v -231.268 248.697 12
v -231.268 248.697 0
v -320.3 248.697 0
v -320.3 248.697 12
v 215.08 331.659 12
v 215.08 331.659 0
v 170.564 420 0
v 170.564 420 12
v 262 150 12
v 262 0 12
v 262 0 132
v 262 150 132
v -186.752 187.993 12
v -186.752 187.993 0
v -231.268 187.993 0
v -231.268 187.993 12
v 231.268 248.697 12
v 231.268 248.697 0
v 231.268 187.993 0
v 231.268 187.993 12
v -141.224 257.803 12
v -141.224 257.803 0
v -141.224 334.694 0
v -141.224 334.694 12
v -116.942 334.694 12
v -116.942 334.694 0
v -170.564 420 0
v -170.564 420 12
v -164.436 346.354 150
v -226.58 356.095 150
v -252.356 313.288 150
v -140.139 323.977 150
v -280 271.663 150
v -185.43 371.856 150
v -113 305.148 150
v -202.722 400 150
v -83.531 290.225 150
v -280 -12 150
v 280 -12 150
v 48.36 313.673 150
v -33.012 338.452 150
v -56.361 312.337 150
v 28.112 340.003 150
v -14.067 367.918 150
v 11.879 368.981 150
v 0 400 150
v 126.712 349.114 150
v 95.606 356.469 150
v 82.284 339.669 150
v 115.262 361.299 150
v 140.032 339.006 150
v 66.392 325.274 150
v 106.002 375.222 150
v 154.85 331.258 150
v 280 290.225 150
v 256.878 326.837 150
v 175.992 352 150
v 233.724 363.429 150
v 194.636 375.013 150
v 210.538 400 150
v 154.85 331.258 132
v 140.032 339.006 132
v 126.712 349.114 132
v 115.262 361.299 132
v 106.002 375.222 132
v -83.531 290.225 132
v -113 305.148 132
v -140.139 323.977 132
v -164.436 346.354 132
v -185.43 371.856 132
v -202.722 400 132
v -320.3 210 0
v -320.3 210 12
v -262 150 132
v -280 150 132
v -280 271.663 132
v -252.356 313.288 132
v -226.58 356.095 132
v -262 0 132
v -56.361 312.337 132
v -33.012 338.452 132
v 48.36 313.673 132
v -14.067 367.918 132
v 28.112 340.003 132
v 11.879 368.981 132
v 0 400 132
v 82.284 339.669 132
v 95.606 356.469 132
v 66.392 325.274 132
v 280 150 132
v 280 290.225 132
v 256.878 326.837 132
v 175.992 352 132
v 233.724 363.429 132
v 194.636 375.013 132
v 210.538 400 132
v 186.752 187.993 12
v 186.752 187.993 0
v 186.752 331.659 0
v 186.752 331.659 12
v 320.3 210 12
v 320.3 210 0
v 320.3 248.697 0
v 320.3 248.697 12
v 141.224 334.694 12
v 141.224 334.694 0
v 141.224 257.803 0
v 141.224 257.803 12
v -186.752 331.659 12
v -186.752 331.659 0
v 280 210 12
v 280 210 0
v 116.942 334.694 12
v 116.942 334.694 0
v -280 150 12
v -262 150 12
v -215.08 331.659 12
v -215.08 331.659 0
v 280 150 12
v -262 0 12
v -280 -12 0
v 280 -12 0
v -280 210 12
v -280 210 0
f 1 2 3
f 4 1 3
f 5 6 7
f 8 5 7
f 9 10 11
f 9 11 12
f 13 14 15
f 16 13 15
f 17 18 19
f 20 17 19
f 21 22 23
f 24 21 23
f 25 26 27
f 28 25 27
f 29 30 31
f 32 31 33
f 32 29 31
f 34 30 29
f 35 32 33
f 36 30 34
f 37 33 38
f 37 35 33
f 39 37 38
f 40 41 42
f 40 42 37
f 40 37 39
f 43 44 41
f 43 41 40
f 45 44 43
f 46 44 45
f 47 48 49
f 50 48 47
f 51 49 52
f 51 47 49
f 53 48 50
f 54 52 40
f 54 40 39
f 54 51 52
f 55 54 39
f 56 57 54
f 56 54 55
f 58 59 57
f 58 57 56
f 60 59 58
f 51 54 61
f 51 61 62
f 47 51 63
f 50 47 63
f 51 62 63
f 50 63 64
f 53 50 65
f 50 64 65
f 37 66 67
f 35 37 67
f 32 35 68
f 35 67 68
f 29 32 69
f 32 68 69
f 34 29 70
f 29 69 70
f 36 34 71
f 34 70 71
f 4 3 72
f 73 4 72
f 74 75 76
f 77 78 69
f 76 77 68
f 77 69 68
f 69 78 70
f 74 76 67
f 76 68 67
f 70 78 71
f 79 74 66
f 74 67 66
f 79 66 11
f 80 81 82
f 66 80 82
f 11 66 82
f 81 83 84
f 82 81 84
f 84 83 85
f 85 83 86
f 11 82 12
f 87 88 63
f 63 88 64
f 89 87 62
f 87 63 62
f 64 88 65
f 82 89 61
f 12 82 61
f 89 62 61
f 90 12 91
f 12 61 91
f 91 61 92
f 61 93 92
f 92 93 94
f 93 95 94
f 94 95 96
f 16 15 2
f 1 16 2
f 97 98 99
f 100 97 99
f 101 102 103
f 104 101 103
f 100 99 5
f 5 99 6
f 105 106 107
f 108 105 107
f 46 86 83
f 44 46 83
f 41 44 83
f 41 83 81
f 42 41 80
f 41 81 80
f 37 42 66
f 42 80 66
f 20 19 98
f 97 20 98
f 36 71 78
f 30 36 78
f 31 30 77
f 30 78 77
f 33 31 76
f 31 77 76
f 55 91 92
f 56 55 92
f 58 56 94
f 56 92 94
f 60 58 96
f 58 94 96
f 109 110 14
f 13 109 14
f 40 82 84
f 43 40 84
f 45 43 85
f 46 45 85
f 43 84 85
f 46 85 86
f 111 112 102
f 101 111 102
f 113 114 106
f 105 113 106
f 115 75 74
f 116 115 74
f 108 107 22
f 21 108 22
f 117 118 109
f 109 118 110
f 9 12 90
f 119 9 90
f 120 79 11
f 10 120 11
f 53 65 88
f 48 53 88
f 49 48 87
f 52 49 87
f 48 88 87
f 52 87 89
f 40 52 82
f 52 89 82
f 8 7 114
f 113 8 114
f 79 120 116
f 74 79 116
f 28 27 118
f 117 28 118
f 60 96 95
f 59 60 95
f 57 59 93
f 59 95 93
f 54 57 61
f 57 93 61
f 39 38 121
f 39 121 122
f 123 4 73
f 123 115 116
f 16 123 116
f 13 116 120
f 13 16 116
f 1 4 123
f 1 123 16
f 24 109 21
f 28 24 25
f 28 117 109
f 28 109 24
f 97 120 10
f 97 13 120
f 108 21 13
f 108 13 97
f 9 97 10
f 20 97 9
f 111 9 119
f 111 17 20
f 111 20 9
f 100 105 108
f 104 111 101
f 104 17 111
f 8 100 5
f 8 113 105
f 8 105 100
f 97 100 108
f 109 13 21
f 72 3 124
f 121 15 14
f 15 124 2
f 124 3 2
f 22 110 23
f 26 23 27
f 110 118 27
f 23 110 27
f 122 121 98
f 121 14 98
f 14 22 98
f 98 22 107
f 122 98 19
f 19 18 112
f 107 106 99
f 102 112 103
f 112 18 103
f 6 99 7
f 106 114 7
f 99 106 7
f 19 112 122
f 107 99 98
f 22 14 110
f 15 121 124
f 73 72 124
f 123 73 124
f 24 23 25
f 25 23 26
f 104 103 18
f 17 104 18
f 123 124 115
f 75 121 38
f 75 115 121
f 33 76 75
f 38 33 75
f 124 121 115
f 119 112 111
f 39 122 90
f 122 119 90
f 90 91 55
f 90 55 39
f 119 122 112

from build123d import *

# Parameters (mm, degrees)
F1_DEPTH = 12
F2_W     = 18
F2_H     = 150
F3_DEPTH = 120
F4_W     = 18
F4_H     = 150
F5_DEPTH = 18
F6_W     = 560
F6_H     = 150
F7_DEPTH = 12


with BuildPart() as f1:
    # F0 (on Top) → F1 (new body)
    with BuildSketch(Plane.XY):
        Polygon((-280, 0), (0, 0), (0, 257.8027844429), (-141.2238776684, 257.8027844429), (-141.2238776684, 334.6943855286), (-116.9423237443, 334.6943855286), (-170.564070344, 420), (-215.0802463293, 331.659168005), (-186.751767993, 331.659168005), (-186.751767993, 187.9933476448), (-231.2679439783, 187.9933476448), (-231.2679439783, 248.6972212791), (-320.3002810478, 248.6972212791), (-320.3002810478, 210), (-280, 210), align=None)
        Polygon((0, 257.8027844429), (0, 0), (280, 0), (280, 210), (320.3002810478, 210), (320.3002810478, 248.6972212791), (231.2679439783, 248.6972212791), (231.2679439783, 187.9933476448), (186.751767993, 187.9933476448), (186.751767993, 331.659168005), (215.0802463293, 331.659168005), (170.564070344, 420), (116.9423237443, 334.6943855286), (141.2238776684, 334.6943855286), (141.2238776684, 257.8027844429), align=None)
    extrude(amount=F1_DEPTH)

    # F2 (on face) → F3 (join)
    with BuildSketch(Plane.XY.offset(12)):
        with Locations((271, 75)):
            Rectangle(F2_W, F2_H)
        with Locations((-271, 75)):
            Rectangle(F2_W, F2_H)
    extrude(amount=F3_DEPTH)

    # F4 (on face) → F5 (join)
    with BuildSketch(Plane.XY.offset(132)):
        with Locations((-271, 75)):
            Rectangle(F4_W, F4_H)
        with BuildLine():
            Line((-262, 150), (-262, 0))
            Line((-262, 0), (280, 0))
            Line((280, 0), (280, 290.2253270149))
            ThreePointArc((280, 290.2253270149), (245.3046465179, 345.1352809089), (210.5378061533, 400))
            ThreePointArc((210.5378061533, 400), (185.6424554033, 363.2406210102), (154.8503190279, 331.2582075596))
            ThreePointArc((154.8503190279, 331.2582075596), (126.7121671615, 349.1136575609), (106.0016453266, 375.2220273018))
            ThreePointArc((106.0016453266, 375.2220273018), (82.2836881086, 339.6685760287), (48.3601950109, 313.6726915836))
            ThreePointArc((48.3601950109, 313.6726915836), (19.4703625217, 354.197972067), (0, 400))
            ThreePointArc((0, 400), (-33.0118277181, 338.4516060295), (-83.5312455893, 290.2253270149))
            ThreePointArc((-83.5312455893, 290.2253270149), (-152.6734230413, 334.7469853741), (-202.7220278978, 400))
            ThreePointArc((-202.7220278978, 400), (-239.2310011006, 334.5488326327), (-280, 271.6628313065))
            Line((-280, 271.6628313065), (-280, 150))
            Line((-280, 150), (-262, 150))
        make_face()
    extrude(amount=F5_DEPTH)

    # F6 (on face) → F7 (join)
    with BuildSketch(Plane.XZ):
        with Locations((0, 75)):
            Rectangle(F6_W, F6_H)
    extrude(amount=F7_DEPTH)


solid = f1.part
